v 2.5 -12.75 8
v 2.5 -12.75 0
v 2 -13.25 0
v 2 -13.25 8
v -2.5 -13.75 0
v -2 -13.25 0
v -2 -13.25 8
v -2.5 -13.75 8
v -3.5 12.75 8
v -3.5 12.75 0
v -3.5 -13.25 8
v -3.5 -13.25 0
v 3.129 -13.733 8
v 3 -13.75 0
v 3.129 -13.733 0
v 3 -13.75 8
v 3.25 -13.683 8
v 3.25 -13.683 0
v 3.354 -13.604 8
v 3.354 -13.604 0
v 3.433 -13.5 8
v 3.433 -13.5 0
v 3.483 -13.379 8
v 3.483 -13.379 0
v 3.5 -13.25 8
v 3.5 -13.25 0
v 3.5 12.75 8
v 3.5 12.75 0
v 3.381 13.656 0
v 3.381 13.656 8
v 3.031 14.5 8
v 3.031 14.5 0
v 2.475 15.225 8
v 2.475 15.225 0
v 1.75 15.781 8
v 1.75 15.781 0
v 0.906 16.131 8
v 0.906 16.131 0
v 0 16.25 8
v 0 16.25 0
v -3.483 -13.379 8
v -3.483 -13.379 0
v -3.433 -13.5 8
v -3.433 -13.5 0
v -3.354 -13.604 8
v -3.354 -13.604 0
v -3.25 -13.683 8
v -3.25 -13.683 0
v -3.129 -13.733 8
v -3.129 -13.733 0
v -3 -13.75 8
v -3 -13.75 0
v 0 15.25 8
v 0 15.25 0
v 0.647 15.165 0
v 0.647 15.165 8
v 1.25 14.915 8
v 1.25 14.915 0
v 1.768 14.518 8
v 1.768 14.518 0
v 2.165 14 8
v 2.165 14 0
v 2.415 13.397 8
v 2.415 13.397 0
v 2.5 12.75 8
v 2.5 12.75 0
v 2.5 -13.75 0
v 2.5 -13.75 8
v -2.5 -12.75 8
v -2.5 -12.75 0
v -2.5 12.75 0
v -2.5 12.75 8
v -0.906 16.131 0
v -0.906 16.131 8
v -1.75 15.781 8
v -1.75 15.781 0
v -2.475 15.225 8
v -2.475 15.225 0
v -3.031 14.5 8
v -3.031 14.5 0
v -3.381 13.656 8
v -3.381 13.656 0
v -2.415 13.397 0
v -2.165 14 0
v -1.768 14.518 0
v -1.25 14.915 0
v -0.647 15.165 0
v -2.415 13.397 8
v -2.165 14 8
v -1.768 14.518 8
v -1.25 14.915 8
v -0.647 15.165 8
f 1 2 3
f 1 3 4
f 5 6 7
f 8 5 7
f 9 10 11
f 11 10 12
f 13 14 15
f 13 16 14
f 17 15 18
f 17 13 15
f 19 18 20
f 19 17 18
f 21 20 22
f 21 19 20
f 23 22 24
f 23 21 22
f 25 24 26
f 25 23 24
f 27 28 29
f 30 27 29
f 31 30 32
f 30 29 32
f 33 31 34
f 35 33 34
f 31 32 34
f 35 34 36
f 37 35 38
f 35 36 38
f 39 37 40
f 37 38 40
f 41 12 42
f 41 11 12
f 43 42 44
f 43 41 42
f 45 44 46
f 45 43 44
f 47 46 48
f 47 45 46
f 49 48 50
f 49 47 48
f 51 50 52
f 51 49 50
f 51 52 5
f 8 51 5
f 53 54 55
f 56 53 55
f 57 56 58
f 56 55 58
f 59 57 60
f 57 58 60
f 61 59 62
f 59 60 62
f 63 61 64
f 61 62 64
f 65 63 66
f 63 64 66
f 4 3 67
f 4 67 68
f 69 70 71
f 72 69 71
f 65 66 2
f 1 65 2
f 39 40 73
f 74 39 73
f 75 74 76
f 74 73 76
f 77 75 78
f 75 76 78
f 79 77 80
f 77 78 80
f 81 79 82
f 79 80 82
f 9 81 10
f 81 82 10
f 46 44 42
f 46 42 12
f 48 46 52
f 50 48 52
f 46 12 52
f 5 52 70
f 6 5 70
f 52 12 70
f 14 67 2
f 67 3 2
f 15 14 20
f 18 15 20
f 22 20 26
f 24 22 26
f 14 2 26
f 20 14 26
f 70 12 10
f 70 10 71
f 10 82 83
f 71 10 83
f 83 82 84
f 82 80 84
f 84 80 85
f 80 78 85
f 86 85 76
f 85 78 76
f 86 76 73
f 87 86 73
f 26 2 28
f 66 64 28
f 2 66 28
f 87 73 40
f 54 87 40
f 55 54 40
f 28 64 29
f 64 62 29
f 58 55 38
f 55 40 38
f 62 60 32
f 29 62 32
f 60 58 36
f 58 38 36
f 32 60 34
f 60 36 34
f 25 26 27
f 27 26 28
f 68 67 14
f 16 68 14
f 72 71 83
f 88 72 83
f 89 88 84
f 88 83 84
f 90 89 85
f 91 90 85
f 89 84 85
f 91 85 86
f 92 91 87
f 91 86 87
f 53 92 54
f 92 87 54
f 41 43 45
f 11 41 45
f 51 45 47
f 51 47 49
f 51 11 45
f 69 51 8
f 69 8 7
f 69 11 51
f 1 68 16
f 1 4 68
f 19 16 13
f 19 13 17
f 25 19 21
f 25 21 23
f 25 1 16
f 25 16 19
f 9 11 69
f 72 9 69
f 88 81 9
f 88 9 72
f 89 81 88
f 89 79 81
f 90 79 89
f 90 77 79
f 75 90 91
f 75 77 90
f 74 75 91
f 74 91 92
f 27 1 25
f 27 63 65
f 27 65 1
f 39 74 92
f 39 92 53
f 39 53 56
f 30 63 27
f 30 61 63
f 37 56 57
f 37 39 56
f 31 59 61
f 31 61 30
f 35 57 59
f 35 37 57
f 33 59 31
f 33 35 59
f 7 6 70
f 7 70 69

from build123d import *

# Parameters (mm, degrees)
F1_DEPTH = 8
F2_R     = 0.5
F3_SIZE  = 0.49999


# Not quite as in the source:
# - a fillet or chamfer is up to 0.001 mm smaller than in the source, because OpenCascade refuses the exact size


with BuildPart() as f1:
    # F0 (on Top) → F1 (new body)
    with BuildSketch(Plane.XY):
        with BuildLine():
            Line((-2.5, -12.75), (-2.5, 12.75))
            ThreePointArc((-2.5, 12.75), (-1.767766953, 14.517766953), (0, 15.25))
            ThreePointArc((0, 15.25), (1.767766953, 14.517766953), (2.5, 12.75))
            Line((2.5, 12.75), (2.5, -12.75))
            Line((2.5, -12.75), (2, -12.75))
            Line((2, -12.75), (2, -13.75))
            Line((2, -13.75), (3.5, -13.75))
            Line((3.5, -13.75), (3.5, 12.75))
            ThreePointArc((3.5, 12.75), (2.4748737342, 15.2248737342), (0, 16.25))
            ThreePointArc((0, 16.25), (-2.4748737342, 15.2248737342), (-3.5, 12.75))
            Line((-3.5, 12.75), (-3.5, -13.75))
            Line((-3.5, -13.75), (-2, -13.75))
            Line((-2, -13.75), (-2, -12.75))
            Line((-2, -12.75), (-2.5, -12.75))
        make_face()
    extrude(amount=F1_DEPTH)

    # F2
    f2_edges = [f1.edges().sort_by_distance(p)[0] for p in [
        (-3.5, -13.75, 4),
        (3.5, -13.75, 4),
    ]]
    fillet(f2_edges, radius=F2_R)

    # F3 (size 0.5 in the source; OpenCascade refuses exactly that, so slightly less here)
    f3_edges = [f1.edges().sort_by_distance(p)[0] for p in [
        (-2, -13.75, 4),
        (-2, -12.75, 4),
        (2, -13.75, 4),
        (2, -12.75, 4),
    ]]
    chamfer(f3_edges, length=F3_SIZE)


solid = f1.part
